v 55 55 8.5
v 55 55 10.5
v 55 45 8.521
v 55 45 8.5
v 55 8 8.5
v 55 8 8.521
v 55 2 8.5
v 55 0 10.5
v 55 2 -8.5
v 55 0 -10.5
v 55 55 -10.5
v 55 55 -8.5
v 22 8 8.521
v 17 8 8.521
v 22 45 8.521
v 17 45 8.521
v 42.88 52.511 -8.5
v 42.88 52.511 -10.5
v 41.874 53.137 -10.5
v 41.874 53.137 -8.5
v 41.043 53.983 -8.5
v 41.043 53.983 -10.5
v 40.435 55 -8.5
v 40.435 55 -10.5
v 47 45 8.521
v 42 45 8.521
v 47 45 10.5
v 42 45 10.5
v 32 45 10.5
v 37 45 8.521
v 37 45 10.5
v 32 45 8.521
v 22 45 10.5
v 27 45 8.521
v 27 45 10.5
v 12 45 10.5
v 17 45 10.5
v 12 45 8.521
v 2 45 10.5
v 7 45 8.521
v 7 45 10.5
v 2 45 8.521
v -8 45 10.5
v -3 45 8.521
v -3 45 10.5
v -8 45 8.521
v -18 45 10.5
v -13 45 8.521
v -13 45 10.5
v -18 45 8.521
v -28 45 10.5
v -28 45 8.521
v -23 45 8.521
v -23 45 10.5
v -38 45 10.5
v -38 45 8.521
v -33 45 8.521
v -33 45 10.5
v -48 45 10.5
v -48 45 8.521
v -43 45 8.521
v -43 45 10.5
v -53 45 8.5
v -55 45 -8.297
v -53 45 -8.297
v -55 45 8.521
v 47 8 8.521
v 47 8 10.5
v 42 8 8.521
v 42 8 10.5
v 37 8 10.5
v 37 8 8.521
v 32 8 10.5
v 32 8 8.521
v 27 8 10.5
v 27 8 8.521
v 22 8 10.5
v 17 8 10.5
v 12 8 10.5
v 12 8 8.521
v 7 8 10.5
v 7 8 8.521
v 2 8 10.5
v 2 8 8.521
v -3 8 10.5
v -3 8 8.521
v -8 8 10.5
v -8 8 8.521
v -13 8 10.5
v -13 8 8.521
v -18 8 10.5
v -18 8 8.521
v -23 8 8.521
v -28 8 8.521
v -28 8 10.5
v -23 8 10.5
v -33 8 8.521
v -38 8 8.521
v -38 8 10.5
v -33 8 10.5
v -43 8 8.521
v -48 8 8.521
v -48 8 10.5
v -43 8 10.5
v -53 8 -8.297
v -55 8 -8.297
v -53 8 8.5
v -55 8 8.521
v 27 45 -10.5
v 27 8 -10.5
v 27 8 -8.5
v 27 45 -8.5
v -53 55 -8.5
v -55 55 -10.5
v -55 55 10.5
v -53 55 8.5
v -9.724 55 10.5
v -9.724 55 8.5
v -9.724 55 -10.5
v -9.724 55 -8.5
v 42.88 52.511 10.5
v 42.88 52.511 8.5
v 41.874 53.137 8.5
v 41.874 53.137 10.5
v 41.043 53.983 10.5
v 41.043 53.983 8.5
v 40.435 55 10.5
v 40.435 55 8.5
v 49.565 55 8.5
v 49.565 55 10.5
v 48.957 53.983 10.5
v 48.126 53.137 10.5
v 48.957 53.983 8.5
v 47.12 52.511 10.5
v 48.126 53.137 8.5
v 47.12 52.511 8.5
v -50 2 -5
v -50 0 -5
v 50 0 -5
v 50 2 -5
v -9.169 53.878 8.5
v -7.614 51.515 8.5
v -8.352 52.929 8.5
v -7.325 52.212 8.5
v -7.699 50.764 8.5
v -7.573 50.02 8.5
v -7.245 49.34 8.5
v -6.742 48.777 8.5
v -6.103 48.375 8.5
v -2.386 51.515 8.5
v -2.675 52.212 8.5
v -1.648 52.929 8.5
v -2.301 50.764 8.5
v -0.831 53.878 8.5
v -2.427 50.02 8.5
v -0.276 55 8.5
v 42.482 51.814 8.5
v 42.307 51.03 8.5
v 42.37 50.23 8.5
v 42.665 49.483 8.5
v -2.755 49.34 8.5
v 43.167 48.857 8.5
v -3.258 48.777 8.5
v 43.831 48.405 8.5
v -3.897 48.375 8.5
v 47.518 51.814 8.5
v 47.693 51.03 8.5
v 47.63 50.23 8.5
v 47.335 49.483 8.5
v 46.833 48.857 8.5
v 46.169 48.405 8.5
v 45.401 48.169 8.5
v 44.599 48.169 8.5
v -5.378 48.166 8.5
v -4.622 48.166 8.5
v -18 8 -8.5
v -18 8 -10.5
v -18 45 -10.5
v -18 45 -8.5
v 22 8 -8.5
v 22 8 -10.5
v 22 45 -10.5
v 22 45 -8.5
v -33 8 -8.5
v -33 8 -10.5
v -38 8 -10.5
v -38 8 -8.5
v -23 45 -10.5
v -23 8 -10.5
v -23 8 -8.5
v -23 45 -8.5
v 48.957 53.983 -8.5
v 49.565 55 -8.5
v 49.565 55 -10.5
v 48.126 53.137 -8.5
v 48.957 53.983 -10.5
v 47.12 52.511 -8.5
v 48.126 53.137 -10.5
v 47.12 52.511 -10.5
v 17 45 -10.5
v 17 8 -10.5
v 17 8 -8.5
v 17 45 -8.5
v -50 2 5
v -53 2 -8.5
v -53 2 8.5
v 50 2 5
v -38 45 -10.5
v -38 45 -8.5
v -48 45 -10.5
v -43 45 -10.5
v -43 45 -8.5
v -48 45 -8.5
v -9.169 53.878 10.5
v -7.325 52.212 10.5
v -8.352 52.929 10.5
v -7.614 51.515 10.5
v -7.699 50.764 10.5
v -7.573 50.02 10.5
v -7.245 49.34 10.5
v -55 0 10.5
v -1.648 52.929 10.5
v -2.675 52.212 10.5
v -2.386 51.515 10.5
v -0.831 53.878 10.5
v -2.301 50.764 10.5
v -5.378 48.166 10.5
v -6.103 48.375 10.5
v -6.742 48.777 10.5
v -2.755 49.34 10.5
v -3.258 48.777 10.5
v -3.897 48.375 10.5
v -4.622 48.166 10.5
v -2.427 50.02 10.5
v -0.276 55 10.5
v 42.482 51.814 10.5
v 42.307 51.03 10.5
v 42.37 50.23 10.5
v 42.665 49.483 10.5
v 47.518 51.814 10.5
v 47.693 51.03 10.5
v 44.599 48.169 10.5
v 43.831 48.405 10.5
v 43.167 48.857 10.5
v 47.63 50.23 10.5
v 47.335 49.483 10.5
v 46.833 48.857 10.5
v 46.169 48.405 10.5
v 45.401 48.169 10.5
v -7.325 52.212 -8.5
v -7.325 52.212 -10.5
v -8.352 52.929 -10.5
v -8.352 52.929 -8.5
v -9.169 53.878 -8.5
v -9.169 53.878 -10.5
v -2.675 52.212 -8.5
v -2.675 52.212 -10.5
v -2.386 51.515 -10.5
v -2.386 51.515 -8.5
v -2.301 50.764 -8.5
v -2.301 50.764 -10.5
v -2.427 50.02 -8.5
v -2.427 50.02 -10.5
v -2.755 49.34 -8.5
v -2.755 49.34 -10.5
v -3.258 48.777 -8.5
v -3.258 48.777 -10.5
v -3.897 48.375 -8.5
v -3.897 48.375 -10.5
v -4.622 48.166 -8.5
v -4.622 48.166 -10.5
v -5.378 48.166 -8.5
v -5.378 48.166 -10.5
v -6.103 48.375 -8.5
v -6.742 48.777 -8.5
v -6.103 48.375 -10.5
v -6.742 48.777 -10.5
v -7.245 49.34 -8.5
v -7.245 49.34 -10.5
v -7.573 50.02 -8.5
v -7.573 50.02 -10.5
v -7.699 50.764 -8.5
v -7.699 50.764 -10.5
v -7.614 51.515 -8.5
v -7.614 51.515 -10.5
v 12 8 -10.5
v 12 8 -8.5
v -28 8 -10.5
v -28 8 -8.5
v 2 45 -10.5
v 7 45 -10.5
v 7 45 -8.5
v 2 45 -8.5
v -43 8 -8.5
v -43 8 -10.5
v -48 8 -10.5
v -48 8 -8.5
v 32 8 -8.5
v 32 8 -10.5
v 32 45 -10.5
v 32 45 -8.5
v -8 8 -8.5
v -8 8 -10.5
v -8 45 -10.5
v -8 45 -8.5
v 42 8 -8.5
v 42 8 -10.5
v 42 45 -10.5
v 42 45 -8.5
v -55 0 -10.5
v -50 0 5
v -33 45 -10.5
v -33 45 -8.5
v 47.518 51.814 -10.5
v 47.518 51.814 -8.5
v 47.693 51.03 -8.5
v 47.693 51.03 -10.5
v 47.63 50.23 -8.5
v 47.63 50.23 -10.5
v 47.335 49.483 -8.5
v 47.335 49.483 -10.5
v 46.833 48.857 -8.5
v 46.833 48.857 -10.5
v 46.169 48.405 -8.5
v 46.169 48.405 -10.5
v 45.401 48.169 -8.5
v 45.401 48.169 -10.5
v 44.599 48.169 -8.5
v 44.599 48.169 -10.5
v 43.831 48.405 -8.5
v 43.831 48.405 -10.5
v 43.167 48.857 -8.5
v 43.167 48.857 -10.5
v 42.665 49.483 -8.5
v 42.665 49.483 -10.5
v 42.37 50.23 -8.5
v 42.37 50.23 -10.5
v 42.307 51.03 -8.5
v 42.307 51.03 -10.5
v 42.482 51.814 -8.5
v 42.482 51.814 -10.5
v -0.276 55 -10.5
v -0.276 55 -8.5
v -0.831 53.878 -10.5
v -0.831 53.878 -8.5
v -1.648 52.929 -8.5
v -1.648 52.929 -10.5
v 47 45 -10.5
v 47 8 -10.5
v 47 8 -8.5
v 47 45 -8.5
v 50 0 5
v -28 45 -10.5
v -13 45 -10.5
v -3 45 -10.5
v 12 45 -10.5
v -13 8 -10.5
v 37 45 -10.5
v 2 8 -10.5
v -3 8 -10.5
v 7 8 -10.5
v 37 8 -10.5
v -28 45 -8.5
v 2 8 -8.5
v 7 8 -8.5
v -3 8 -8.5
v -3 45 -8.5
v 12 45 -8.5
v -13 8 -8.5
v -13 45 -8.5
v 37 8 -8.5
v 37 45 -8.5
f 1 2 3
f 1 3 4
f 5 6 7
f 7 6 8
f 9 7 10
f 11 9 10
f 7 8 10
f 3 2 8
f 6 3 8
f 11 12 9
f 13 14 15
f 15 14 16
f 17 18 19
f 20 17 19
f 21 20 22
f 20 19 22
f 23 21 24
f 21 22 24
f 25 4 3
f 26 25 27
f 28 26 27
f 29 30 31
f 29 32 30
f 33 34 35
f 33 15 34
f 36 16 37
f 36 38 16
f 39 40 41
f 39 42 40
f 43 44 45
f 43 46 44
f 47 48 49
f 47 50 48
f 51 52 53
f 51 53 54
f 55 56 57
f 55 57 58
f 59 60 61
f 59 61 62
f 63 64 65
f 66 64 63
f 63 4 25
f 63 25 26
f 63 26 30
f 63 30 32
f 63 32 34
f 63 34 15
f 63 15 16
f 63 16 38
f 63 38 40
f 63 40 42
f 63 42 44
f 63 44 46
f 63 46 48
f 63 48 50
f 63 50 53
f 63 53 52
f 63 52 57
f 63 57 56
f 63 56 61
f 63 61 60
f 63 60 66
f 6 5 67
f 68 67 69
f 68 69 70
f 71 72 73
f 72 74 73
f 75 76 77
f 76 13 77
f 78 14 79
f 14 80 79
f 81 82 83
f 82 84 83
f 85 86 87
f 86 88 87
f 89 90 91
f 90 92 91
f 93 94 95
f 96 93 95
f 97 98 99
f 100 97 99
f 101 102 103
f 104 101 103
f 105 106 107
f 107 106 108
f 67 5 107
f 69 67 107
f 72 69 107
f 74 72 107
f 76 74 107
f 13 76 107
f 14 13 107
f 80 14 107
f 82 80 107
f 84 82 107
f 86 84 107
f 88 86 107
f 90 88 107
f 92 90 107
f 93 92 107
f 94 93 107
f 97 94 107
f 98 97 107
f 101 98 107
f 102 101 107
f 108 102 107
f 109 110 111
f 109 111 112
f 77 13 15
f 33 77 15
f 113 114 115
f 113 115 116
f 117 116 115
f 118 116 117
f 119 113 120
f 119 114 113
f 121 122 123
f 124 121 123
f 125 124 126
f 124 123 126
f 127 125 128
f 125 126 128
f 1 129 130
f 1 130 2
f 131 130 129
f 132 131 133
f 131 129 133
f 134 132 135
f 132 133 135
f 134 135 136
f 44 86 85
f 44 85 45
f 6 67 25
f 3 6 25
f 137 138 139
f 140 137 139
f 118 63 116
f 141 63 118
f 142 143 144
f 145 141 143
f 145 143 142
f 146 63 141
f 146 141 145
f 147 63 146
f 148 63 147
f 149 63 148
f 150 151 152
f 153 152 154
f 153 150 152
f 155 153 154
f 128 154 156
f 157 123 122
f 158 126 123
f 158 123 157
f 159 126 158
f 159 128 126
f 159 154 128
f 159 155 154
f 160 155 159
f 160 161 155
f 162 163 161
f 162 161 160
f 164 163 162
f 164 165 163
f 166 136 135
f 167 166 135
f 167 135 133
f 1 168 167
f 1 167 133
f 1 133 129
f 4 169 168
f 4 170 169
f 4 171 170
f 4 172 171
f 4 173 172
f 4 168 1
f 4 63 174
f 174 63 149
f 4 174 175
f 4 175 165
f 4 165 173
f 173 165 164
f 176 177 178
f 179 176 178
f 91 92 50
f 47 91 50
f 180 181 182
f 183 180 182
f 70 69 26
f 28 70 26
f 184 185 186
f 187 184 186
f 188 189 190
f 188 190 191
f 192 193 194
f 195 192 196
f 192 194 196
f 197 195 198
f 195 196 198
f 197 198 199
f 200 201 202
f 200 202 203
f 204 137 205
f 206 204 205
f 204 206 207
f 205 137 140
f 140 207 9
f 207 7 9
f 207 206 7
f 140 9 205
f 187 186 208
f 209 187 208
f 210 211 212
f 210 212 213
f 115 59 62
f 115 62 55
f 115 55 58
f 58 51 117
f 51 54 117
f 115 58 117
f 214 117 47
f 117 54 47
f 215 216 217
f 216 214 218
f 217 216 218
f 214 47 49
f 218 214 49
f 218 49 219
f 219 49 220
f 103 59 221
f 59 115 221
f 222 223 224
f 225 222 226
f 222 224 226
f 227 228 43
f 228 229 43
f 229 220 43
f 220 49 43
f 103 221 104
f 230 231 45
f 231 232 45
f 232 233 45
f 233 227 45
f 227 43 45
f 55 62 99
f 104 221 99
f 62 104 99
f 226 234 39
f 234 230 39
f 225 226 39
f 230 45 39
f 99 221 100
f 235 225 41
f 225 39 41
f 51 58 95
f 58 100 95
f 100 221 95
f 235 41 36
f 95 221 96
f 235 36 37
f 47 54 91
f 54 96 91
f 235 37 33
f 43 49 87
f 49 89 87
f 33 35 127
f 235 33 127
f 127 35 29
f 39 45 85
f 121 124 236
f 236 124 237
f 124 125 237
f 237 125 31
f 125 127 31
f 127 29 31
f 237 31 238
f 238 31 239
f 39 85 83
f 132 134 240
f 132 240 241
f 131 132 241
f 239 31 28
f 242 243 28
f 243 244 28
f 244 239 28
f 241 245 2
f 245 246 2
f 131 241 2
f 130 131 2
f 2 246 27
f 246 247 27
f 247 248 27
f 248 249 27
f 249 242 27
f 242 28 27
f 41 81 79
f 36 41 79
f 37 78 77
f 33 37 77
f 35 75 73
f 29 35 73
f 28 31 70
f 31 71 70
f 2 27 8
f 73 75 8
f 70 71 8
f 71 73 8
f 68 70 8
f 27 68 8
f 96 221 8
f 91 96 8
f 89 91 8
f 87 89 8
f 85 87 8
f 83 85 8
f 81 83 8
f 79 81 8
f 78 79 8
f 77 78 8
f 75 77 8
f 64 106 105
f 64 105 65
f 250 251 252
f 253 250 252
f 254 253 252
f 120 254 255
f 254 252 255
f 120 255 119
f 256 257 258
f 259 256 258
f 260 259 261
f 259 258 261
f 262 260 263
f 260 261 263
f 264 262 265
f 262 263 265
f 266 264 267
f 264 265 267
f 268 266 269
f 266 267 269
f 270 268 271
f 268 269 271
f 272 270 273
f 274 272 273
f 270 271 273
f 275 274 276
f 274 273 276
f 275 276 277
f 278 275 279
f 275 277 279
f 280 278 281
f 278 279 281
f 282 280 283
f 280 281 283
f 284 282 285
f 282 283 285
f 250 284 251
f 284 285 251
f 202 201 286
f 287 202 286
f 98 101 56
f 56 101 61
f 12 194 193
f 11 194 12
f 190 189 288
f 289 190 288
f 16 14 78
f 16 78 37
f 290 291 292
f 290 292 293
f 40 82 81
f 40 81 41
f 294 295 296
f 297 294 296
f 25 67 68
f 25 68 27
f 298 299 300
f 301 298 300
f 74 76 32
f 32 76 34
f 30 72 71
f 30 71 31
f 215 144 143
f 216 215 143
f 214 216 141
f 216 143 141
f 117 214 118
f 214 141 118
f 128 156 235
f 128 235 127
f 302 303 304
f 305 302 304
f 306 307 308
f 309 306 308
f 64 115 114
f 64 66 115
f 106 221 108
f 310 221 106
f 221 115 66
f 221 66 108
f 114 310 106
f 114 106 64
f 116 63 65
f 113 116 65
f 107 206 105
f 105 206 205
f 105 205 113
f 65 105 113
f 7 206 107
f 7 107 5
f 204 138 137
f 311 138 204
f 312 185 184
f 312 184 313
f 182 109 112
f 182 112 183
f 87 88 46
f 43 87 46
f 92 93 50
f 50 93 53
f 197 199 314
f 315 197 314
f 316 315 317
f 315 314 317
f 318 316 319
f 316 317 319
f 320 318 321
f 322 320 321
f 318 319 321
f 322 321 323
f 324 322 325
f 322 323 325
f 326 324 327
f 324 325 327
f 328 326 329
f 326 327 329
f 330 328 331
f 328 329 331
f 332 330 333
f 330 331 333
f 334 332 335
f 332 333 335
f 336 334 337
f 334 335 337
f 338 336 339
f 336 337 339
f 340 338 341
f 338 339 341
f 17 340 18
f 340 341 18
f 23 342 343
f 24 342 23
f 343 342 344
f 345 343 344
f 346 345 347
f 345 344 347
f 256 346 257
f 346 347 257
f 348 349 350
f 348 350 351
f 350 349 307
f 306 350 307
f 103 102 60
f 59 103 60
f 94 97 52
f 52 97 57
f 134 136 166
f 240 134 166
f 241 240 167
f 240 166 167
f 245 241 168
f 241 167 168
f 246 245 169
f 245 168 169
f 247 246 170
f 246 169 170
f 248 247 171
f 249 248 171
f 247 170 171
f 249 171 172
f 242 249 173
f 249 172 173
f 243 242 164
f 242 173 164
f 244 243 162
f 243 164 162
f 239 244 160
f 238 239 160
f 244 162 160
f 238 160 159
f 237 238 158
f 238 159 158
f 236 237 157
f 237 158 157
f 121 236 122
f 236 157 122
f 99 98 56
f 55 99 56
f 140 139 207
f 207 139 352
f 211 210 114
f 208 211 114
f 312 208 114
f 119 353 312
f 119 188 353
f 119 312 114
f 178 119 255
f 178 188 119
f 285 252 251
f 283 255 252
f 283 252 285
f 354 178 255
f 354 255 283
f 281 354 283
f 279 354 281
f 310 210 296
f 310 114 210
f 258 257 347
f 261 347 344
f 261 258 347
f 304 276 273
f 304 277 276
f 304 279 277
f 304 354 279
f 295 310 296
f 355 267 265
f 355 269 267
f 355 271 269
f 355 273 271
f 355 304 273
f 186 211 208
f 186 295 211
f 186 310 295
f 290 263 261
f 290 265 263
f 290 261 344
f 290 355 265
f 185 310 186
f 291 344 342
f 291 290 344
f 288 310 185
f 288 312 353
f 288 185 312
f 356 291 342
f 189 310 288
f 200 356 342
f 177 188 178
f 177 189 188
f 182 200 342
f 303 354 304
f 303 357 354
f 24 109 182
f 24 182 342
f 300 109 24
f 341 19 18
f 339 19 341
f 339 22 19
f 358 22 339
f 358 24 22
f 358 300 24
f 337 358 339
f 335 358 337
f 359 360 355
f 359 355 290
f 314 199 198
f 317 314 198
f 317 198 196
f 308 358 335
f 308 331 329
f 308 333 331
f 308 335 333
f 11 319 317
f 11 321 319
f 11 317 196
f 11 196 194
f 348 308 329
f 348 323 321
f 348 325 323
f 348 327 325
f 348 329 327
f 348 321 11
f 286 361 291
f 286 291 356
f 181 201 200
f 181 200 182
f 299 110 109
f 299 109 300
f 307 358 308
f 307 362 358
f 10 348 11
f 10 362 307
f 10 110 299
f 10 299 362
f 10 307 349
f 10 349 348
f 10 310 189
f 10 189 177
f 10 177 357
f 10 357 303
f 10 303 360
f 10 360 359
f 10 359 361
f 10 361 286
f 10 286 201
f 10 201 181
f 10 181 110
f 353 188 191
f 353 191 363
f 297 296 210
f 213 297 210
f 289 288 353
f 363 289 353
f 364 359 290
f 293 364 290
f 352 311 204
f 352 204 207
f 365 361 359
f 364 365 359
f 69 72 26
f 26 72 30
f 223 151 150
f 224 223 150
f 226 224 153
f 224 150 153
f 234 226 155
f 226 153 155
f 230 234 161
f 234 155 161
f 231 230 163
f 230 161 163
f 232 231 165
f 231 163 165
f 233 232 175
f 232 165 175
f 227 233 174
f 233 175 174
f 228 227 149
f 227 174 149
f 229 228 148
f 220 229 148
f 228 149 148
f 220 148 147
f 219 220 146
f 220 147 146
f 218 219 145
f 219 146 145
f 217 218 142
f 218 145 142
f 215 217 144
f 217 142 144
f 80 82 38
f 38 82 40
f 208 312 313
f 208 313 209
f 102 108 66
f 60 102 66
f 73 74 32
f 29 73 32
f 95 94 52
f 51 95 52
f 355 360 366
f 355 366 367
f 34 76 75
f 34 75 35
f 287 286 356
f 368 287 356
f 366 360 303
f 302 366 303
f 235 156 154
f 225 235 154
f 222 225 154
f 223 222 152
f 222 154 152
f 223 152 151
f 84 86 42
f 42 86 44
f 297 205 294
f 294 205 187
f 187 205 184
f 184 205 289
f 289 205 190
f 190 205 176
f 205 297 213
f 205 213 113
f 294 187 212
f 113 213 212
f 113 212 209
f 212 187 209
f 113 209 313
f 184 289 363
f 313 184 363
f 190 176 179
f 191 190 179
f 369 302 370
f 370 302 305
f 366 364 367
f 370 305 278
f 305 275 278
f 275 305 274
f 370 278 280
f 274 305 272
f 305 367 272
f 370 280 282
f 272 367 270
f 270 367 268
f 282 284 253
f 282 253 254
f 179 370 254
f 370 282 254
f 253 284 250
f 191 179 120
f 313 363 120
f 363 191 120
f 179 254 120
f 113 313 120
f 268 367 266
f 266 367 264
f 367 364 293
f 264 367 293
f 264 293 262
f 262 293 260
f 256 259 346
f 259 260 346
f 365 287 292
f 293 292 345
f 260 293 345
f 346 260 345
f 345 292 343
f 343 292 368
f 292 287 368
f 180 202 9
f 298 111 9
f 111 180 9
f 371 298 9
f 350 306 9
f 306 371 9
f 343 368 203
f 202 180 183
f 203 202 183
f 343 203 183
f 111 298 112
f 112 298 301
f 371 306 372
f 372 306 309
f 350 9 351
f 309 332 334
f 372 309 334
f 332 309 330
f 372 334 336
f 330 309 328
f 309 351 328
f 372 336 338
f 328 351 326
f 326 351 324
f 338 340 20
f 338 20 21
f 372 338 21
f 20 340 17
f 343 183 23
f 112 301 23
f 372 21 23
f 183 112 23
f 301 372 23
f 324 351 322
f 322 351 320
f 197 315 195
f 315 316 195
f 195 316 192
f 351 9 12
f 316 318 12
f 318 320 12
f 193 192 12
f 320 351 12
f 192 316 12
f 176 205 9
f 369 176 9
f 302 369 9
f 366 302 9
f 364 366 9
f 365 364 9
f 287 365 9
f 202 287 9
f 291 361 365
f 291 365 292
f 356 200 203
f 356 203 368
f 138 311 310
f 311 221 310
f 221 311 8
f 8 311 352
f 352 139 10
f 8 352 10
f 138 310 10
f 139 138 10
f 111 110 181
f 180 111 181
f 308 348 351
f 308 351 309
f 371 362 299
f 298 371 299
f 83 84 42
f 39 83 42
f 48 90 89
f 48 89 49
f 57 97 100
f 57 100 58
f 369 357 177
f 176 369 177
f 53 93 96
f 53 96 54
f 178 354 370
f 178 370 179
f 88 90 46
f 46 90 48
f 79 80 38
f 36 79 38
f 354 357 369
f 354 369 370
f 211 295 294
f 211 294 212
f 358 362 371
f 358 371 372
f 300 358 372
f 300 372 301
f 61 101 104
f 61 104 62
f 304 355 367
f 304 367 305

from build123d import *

# Parameters (mm, degrees)
SKETCH_1_W           = 110
SKETCH_1_H           = 21
EXTRUDE_1_DEPTH      = 55
SHELL_1_T            = -2
SKETCH_2_W           = 17
SKETCH_2_H           = 53
CUT_EXTRUDE_1_DEPTH  = 50
SKETCH_8_W           = 5
SKETCH_8_H           = 37
CUT_EXTRUDE_8_DEPTH  = 22
SKETCH_9_W           = 16.817883905
SKETCH_9_H           = 37
CUT_EXTRUDE_9_DEPTH  = 111
SKETCH_10_W          = 100
SKETCH_10_H          = 10
CUT_EXTRUDE_10_DEPTH = 56
CUT_EXTRUDE_11_DEPTH = 22


with BuildPart() as part:
    # 草图1 → 凸台-拉伸1 (new body)
    with BuildSketch(Plane(origin=(0, 0, 0), x_dir=(1, 0, 0), z_dir=(0, 1, 0))):
        Rectangle(SKETCH_1_W, SKETCH_1_H)
    extrude(amount=EXTRUDE_1_DEPTH)

    # 抽壳1
    shell_1_openings = [part.faces().sort_by_distance(p)[0] for p in [
        (0, 55, 0),
    ]]
    offset(amount=SHELL_1_T, openings=shell_1_openings, kind=Kind.INTERSECTION)

    # 草图2 → 切除-拉伸1 (cut)
    with BuildSketch(Plane(origin=(55, 0, 0), x_dir=(0, 0, -1), z_dir=(1, 0, 0))):
        with Locations((0, 28.5)):
            Rectangle(SKETCH_2_W, SKETCH_2_H)
    extrude(amount=-CUT_EXTRUDE_1_DEPTH, mode=Mode.SUBTRACT)

    # 草图8 → 切除-拉伸8 (cut, through all)
    with BuildSketch(Plane(origin=(0, 0, -10.5), x_dir=(-1, 0, 0), z_dir=(0, 0, -1))):
        with Locations((-34.5, 26.5)):
            Rectangle(SKETCH_8_W, SKETCH_8_H)
        with Locations((-44.5, 26.5)):
            Rectangle(SKETCH_8_W, SKETCH_8_H)
        with Locations((-24.5, 26.5)):
            Rectangle(SKETCH_8_W, SKETCH_8_H)
        with Locations((-14.5, 26.5)):
            Rectangle(SKETCH_8_W, SKETCH_8_H)
        with Locations((-4.5, 26.5)):
            Rectangle(SKETCH_8_W, SKETCH_8_H)
        with Locations((5.5, 26.5)):
            Rectangle(SKETCH_8_W, SKETCH_8_H)
        with Locations((15.5, 26.5)):
            Rectangle(SKETCH_8_W, SKETCH_8_H)
        with Locations((25.5, 26.5)):
            Rectangle(SKETCH_8_W, SKETCH_8_H)
        with Locations((35.5, 26.5)):
            Rectangle(SKETCH_8_W, SKETCH_8_H)
        with Locations((45.5, 26.5)):
            Rectangle(SKETCH_8_W, SKETCH_8_H)
    extrude(amount=-CUT_EXTRUDE_8_DEPTH, mode=Mode.SUBTRACT)

    # 草图9 → 切除-拉伸9 (cut, through all)
    with BuildSketch(Plane.ZY.offset(55)):
        with Locations((0.111623124, 26.5)):
            Rectangle(SKETCH_9_W, SKETCH_9_H)
    extrude(amount=-CUT_EXTRUDE_9_DEPTH, mode=Mode.SUBTRACT)

    # 草图10 → 切除-拉伸10 (cut, through all)
    with BuildSketch(Plane.XZ):
        Rectangle(SKETCH_10_W, SKETCH_10_H)
    extrude(amount=-CUT_EXTRUDE_10_DEPTH, mode=Mode.SUBTRACT)

    # 草图5 → 切除-拉伸11 (cut, through all)
    with BuildSketch(Plane(origin=(0, 0, -10.5), x_dir=(-1, 0, 0), z_dir=(0, 0, -1))):
        with BuildLine():
            ThreePointArc((-47.120181843, 52.510910871), (-45, 48.139136677), (-42.879818157, 52.510910871))
            ThreePointArc((-42.879818157, 52.510910871), (-45, 62.039136677), (-47.120181843, 52.510910871))
        make_face()
        with BuildLine():
            ThreePointArc((2.675165182, 52.212141801), (5, 48.139136677), (7.324834818, 52.212141801))
            ThreePointArc((7.324834818, 52.212141801), (5, 61.638781957), (2.675165182, 52.212141801))
        make_face()
    extrude(amount=-CUT_EXTRUDE_11_DEPTH, mode=Mode.SUBTRACT)


solid = part.part
